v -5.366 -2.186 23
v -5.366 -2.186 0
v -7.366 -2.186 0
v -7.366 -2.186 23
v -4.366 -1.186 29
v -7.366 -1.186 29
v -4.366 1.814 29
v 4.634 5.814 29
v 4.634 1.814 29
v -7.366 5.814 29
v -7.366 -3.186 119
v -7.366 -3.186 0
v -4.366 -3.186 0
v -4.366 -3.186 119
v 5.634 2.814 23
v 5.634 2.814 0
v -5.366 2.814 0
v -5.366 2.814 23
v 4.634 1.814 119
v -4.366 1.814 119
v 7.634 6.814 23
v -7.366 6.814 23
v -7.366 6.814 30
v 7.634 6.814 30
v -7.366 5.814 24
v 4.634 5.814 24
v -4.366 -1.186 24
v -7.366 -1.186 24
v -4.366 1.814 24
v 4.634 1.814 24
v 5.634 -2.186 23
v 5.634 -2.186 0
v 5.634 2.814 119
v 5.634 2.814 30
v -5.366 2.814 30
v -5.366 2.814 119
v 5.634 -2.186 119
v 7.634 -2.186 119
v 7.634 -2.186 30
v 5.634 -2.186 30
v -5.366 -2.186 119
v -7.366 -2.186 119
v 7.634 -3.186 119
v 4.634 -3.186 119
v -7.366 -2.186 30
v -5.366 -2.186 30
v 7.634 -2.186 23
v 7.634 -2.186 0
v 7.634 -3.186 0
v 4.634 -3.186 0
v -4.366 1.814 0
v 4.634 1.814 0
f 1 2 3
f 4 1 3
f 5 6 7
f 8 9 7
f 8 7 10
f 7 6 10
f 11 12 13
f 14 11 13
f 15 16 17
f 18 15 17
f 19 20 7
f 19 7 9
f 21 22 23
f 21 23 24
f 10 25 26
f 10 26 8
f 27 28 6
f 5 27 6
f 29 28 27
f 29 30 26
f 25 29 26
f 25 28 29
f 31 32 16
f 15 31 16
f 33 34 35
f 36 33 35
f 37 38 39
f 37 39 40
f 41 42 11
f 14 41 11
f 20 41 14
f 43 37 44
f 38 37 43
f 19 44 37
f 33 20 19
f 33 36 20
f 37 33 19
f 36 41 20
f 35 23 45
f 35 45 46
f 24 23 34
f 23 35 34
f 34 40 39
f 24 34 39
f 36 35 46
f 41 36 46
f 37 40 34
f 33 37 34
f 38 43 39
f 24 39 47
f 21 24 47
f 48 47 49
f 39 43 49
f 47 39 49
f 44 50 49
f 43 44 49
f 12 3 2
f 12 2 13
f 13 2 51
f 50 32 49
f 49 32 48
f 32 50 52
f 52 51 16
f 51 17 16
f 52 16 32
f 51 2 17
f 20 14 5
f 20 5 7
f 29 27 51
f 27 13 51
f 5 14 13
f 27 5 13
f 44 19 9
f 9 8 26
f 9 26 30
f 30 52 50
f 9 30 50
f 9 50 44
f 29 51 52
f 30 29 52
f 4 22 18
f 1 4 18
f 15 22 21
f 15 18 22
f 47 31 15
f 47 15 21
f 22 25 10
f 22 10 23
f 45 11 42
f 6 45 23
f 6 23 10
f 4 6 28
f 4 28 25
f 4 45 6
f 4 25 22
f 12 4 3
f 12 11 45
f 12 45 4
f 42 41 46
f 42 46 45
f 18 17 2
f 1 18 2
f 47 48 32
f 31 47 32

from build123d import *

# Parameters (mm, degrees)
BOSS_EXTRUDE1_DEPTH = 119
SKETCH2_W           = 15
SKETCH2_H           = 7
BOSS_EXTRUDE2_DEPTH = 9
SKETCH3_W           = 9
SKETCH3_H           = 7
CUT_EXTRUDE1_DEPTH  = 4
SKETCH4_W           = 5
SKETCH4_H           = 7
CUT_EXTRUDE2_DEPTH  = 12


with BuildPart() as part:
    # Sketch1 → Boss-Extrude1 (new body)
    with BuildSketch(Plane.XY):
        Polygon((-5.365984845, -2.186), (-7.365984845, -2.186), (-7.365984845, -3.186), (-4.365984845, -3.186), (-4.365984845, -2.186), (-4.365984845, 1.814), (4.634015155, 1.814), (4.634015155, -2.186), (4.634015155, -3.186), (7.634015155, -3.186), (7.634015155, -2.186), (5.634015155, -2.186), (5.634015155, 2.814), (-5.365984845, 2.814), align=None)
    extrude(amount=BOSS_EXTRUDE1_DEPTH)

    # Sketch2 → Boss-Extrude2 (add)
    with BuildSketch(Plane(origin=(0, -2.186, 0), x_dir=(1, 0, 0), z_dir=(0, 1, 0))):
        with Locations((0.134015155, -26.5)):
            Rectangle(SKETCH2_W, SKETCH2_H)
    extrude(amount=BOSS_EXTRUDE2_DEPTH)

    # Sketch3 → Cut-Extrude1 (cut)
    with BuildSketch(Plane.XZ.offset(2.186)):
        with Locations((0.134015155, 26.5)):
            Rectangle(SKETCH3_W, SKETCH3_H)
    extrude(amount=-CUT_EXTRUDE1_DEPTH, mode=Mode.SUBTRACT)

    # Sketch4 → Cut-Extrude2 (cut)
    with BuildSketch(Plane.ZY.offset(7.365984845)):
        with Locations((26.5, 2.314)):
            Rectangle(SKETCH4_W, SKETCH4_H)
    extrude(amount=-CUT_EXTRUDE2_DEPTH, mode=Mode.SUBTRACT)


solid = part.part
